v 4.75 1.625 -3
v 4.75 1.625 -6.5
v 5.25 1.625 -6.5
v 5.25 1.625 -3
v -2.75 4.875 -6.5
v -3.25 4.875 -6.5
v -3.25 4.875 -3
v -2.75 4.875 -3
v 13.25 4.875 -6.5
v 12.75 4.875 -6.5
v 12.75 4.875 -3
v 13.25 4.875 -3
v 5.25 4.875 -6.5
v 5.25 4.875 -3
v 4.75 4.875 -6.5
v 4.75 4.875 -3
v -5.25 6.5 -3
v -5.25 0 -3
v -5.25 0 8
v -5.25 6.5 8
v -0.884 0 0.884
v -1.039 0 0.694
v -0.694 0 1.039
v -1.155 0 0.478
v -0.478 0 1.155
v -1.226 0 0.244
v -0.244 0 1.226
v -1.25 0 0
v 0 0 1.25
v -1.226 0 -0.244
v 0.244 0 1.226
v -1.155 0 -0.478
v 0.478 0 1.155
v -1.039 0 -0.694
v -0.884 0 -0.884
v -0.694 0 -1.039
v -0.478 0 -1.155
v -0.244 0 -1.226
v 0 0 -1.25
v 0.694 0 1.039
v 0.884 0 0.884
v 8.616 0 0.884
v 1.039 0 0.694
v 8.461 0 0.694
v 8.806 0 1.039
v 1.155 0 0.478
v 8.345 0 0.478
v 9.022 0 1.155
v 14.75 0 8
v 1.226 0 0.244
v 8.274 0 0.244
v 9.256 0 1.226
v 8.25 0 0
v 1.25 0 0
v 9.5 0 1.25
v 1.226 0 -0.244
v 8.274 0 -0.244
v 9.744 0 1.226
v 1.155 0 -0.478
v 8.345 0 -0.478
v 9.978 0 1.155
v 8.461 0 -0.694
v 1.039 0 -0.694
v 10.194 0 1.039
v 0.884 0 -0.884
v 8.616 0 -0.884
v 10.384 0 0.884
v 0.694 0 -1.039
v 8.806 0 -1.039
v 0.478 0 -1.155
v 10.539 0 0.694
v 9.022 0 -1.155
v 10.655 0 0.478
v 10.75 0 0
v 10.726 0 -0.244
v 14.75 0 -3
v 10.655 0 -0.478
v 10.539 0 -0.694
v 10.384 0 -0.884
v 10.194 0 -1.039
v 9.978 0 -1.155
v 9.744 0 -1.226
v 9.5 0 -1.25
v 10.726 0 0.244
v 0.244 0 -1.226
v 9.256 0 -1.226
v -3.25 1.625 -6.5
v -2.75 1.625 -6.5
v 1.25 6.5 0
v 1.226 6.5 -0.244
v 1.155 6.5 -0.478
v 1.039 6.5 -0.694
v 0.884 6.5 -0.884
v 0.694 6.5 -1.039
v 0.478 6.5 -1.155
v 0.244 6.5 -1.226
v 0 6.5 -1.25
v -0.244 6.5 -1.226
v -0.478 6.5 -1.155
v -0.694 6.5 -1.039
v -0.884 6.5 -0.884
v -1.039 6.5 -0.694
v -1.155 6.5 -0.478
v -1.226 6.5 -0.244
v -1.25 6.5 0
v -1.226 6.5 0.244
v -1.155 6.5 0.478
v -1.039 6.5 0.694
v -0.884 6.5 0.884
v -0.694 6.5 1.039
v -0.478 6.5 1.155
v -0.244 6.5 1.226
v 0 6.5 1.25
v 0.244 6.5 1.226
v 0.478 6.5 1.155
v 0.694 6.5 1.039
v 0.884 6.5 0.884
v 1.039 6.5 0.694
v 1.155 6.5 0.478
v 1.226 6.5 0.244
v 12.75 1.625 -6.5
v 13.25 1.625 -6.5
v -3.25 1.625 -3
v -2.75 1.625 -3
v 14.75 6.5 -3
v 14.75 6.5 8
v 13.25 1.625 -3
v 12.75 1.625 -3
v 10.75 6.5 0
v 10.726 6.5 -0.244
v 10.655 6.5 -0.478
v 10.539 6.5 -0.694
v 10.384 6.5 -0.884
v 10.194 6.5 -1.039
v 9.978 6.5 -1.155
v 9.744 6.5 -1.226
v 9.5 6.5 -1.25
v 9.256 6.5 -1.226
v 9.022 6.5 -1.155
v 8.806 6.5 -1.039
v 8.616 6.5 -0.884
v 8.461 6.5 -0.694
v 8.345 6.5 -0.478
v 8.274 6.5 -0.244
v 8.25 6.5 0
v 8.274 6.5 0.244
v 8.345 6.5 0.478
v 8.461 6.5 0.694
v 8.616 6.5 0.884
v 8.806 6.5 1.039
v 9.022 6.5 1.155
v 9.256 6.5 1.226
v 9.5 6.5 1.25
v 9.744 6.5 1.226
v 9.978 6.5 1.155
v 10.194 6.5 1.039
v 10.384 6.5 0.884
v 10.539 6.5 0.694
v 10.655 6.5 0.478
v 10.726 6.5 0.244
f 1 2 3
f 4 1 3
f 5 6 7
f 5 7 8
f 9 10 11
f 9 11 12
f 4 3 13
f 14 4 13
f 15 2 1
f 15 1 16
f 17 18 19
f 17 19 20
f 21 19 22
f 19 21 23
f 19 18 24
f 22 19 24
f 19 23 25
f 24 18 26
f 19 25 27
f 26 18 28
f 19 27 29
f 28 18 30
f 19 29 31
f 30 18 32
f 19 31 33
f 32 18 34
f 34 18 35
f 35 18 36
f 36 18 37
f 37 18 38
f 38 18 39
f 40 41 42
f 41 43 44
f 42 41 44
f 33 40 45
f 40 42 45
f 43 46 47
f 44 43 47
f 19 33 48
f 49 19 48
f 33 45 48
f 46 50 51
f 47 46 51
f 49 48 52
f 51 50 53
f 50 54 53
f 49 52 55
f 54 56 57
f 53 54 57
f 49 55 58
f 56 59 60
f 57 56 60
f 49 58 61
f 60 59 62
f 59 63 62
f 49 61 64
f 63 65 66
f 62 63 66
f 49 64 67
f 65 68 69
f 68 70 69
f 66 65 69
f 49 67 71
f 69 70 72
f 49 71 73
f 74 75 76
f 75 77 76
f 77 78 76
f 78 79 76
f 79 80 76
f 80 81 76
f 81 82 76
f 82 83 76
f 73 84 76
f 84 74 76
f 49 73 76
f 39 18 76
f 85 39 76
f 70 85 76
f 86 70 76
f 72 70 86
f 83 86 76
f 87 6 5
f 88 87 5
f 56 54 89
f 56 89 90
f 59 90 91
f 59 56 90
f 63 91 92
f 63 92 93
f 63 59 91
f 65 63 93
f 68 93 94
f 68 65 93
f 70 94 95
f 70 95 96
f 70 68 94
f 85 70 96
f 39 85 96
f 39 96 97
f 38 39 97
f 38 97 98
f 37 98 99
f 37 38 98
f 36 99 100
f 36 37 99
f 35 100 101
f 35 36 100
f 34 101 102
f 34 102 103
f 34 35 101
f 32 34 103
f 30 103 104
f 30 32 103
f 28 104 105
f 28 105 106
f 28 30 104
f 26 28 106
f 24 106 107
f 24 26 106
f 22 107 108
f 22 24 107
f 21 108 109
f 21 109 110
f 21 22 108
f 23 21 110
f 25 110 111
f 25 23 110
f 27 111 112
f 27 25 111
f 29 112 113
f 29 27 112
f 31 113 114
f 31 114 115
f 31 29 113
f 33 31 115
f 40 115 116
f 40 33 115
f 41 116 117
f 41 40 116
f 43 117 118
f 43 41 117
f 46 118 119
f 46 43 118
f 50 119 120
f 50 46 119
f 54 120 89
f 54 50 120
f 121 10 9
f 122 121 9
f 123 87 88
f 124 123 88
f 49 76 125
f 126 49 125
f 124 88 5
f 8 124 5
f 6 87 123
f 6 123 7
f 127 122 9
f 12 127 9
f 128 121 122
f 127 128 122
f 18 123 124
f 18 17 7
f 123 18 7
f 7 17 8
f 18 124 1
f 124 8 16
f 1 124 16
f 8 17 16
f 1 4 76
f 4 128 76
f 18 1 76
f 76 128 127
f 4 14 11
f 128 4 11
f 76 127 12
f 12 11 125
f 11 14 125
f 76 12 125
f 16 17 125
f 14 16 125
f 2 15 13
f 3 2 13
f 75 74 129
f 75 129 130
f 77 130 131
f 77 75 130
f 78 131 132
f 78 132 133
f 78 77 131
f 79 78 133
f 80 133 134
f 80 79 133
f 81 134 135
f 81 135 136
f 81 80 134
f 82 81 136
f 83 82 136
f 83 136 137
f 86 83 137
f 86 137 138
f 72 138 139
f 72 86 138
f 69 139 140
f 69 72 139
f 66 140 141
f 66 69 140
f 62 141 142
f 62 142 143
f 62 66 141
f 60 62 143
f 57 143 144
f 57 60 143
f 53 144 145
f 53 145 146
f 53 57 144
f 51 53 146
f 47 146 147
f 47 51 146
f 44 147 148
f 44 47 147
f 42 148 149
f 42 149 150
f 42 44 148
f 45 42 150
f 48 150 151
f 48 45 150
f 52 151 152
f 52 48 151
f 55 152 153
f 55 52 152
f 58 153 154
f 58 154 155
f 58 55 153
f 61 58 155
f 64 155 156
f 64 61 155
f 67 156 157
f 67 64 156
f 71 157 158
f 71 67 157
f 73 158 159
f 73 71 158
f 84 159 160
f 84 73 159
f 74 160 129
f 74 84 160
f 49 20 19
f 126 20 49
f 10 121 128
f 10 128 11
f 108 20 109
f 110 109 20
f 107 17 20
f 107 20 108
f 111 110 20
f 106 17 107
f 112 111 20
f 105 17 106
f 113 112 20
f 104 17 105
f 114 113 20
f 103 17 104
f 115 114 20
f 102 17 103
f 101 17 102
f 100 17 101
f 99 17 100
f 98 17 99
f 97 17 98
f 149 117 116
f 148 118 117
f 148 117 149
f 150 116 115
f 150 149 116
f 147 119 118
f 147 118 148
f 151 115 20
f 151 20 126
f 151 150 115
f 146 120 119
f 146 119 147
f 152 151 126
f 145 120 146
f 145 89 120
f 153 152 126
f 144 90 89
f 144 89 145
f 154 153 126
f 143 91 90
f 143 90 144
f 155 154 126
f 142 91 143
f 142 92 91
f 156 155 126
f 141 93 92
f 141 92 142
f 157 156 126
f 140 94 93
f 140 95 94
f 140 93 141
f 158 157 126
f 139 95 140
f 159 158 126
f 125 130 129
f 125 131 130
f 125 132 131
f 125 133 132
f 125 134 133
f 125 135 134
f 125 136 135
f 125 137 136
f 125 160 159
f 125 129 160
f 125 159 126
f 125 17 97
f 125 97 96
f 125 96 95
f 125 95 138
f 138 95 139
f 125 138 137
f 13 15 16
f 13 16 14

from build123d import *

# Parameters (mm, degrees)
BOX008_W          = 0.5
BOX008_H          = 3.25
BOX008_DEPTH      = 3.5
BOX010_W          = 0.5
BOX010_H          = 3.25
BOX010_DEPTH      = 3.5
BOX009_W          = 0.5
BOX009_H          = 3.25
BOX009_DEPTH      = 3.5
CYLINDER009_R     = 1.25
CYLINDER009_DEPTH = 6.5
CYLINDER008_R     = 1.25
CYLINDER008_DEPTH = 6.5
BOX007_W          = 20
BOX007_H          = 6.5
BOX007_DEPTH      = 11


with BuildPart() as limitswitchlead001:
    # Box008 → Box008 (new body)
    with BuildSketch(Plane(origin=(4.75, 1.625, -6.5), x_dir=(1, 0, 0), z_dir=(0, 0, 1))):
        with Locations((0.25, 1.625)):
            Rectangle(BOX008_W, BOX008_H)
    extrude(amount=BOX008_DEPTH)


with BuildPart() as limitswitchlead002:
    # Box010 → Box010 (new body)
    with BuildSketch(Plane(origin=(-3.25, 1.625, -6.5), x_dir=(1, 0, 0), z_dir=(0, 0, 1))):
        with Locations((0.25, 1.625)):
            Rectangle(BOX010_W, BOX010_H)
    extrude(amount=BOX010_DEPTH)


with BuildPart() as limitswitchlead003:
    # Box009 → Box009 (new body)
    with BuildSketch(Plane(origin=(12.75, 1.625, -6.5), x_dir=(1, 0, 0), z_dir=(0, 0, 1))):
        with Locations((0.25, 1.625)):
            Rectangle(BOX009_W, BOX009_H)
    extrude(amount=BOX009_DEPTH)


with BuildPart() as limitswitchmountinghole002:
    # Cylinder009 → Cylinder009 (new body)
    with BuildSketch(Plane(origin=(9.5, 0, 0), x_dir=(1, 0, 0), z_dir=(0, 1, 0))):
        Circle(CYLINDER009_R)
    extrude(amount=CYLINDER009_DEPTH)


with BuildPart() as limitswitchmountinghole001:
    # Cylinder008 → Cylinder008 (new body)
    with BuildSketch(Plane(origin=(0, 0, 0), x_dir=(1, 0, 0), z_dir=(0, 1, 0))):
        Circle(CYLINDER008_R)
    extrude(amount=CYLINDER008_DEPTH)


with BuildPart() as limitswitch_nolever:
    # Box007 → Box007 (new body)
    with BuildSketch(Plane(origin=(-5.25, 0, -3), x_dir=(1, 0, 0), z_dir=(0, 0, 1))):
        with Locations((10, 3.25)):
            Rectangle(BOX007_W, BOX007_H)
    extrude(amount=BOX007_DEPTH)

    # Cut007: cut LimitSwitchMountingHole001
    add(limitswitchmountinghole001.part, mode=Mode.SUBTRACT)

    # Cut008: cut LimitSwitchMountingHole002
    add(limitswitchmountinghole002.part, mode=Mode.SUBTRACT)

    # Fusion005: union LimitSwitchLead001, LimitSwitchLead002, LimitSwitchLead003
    add(limitswitchlead001.part)
    add(limitswitchlead002.part)
    add(limitswitchlead003.part)


solid = limitswitch_nolever.part
